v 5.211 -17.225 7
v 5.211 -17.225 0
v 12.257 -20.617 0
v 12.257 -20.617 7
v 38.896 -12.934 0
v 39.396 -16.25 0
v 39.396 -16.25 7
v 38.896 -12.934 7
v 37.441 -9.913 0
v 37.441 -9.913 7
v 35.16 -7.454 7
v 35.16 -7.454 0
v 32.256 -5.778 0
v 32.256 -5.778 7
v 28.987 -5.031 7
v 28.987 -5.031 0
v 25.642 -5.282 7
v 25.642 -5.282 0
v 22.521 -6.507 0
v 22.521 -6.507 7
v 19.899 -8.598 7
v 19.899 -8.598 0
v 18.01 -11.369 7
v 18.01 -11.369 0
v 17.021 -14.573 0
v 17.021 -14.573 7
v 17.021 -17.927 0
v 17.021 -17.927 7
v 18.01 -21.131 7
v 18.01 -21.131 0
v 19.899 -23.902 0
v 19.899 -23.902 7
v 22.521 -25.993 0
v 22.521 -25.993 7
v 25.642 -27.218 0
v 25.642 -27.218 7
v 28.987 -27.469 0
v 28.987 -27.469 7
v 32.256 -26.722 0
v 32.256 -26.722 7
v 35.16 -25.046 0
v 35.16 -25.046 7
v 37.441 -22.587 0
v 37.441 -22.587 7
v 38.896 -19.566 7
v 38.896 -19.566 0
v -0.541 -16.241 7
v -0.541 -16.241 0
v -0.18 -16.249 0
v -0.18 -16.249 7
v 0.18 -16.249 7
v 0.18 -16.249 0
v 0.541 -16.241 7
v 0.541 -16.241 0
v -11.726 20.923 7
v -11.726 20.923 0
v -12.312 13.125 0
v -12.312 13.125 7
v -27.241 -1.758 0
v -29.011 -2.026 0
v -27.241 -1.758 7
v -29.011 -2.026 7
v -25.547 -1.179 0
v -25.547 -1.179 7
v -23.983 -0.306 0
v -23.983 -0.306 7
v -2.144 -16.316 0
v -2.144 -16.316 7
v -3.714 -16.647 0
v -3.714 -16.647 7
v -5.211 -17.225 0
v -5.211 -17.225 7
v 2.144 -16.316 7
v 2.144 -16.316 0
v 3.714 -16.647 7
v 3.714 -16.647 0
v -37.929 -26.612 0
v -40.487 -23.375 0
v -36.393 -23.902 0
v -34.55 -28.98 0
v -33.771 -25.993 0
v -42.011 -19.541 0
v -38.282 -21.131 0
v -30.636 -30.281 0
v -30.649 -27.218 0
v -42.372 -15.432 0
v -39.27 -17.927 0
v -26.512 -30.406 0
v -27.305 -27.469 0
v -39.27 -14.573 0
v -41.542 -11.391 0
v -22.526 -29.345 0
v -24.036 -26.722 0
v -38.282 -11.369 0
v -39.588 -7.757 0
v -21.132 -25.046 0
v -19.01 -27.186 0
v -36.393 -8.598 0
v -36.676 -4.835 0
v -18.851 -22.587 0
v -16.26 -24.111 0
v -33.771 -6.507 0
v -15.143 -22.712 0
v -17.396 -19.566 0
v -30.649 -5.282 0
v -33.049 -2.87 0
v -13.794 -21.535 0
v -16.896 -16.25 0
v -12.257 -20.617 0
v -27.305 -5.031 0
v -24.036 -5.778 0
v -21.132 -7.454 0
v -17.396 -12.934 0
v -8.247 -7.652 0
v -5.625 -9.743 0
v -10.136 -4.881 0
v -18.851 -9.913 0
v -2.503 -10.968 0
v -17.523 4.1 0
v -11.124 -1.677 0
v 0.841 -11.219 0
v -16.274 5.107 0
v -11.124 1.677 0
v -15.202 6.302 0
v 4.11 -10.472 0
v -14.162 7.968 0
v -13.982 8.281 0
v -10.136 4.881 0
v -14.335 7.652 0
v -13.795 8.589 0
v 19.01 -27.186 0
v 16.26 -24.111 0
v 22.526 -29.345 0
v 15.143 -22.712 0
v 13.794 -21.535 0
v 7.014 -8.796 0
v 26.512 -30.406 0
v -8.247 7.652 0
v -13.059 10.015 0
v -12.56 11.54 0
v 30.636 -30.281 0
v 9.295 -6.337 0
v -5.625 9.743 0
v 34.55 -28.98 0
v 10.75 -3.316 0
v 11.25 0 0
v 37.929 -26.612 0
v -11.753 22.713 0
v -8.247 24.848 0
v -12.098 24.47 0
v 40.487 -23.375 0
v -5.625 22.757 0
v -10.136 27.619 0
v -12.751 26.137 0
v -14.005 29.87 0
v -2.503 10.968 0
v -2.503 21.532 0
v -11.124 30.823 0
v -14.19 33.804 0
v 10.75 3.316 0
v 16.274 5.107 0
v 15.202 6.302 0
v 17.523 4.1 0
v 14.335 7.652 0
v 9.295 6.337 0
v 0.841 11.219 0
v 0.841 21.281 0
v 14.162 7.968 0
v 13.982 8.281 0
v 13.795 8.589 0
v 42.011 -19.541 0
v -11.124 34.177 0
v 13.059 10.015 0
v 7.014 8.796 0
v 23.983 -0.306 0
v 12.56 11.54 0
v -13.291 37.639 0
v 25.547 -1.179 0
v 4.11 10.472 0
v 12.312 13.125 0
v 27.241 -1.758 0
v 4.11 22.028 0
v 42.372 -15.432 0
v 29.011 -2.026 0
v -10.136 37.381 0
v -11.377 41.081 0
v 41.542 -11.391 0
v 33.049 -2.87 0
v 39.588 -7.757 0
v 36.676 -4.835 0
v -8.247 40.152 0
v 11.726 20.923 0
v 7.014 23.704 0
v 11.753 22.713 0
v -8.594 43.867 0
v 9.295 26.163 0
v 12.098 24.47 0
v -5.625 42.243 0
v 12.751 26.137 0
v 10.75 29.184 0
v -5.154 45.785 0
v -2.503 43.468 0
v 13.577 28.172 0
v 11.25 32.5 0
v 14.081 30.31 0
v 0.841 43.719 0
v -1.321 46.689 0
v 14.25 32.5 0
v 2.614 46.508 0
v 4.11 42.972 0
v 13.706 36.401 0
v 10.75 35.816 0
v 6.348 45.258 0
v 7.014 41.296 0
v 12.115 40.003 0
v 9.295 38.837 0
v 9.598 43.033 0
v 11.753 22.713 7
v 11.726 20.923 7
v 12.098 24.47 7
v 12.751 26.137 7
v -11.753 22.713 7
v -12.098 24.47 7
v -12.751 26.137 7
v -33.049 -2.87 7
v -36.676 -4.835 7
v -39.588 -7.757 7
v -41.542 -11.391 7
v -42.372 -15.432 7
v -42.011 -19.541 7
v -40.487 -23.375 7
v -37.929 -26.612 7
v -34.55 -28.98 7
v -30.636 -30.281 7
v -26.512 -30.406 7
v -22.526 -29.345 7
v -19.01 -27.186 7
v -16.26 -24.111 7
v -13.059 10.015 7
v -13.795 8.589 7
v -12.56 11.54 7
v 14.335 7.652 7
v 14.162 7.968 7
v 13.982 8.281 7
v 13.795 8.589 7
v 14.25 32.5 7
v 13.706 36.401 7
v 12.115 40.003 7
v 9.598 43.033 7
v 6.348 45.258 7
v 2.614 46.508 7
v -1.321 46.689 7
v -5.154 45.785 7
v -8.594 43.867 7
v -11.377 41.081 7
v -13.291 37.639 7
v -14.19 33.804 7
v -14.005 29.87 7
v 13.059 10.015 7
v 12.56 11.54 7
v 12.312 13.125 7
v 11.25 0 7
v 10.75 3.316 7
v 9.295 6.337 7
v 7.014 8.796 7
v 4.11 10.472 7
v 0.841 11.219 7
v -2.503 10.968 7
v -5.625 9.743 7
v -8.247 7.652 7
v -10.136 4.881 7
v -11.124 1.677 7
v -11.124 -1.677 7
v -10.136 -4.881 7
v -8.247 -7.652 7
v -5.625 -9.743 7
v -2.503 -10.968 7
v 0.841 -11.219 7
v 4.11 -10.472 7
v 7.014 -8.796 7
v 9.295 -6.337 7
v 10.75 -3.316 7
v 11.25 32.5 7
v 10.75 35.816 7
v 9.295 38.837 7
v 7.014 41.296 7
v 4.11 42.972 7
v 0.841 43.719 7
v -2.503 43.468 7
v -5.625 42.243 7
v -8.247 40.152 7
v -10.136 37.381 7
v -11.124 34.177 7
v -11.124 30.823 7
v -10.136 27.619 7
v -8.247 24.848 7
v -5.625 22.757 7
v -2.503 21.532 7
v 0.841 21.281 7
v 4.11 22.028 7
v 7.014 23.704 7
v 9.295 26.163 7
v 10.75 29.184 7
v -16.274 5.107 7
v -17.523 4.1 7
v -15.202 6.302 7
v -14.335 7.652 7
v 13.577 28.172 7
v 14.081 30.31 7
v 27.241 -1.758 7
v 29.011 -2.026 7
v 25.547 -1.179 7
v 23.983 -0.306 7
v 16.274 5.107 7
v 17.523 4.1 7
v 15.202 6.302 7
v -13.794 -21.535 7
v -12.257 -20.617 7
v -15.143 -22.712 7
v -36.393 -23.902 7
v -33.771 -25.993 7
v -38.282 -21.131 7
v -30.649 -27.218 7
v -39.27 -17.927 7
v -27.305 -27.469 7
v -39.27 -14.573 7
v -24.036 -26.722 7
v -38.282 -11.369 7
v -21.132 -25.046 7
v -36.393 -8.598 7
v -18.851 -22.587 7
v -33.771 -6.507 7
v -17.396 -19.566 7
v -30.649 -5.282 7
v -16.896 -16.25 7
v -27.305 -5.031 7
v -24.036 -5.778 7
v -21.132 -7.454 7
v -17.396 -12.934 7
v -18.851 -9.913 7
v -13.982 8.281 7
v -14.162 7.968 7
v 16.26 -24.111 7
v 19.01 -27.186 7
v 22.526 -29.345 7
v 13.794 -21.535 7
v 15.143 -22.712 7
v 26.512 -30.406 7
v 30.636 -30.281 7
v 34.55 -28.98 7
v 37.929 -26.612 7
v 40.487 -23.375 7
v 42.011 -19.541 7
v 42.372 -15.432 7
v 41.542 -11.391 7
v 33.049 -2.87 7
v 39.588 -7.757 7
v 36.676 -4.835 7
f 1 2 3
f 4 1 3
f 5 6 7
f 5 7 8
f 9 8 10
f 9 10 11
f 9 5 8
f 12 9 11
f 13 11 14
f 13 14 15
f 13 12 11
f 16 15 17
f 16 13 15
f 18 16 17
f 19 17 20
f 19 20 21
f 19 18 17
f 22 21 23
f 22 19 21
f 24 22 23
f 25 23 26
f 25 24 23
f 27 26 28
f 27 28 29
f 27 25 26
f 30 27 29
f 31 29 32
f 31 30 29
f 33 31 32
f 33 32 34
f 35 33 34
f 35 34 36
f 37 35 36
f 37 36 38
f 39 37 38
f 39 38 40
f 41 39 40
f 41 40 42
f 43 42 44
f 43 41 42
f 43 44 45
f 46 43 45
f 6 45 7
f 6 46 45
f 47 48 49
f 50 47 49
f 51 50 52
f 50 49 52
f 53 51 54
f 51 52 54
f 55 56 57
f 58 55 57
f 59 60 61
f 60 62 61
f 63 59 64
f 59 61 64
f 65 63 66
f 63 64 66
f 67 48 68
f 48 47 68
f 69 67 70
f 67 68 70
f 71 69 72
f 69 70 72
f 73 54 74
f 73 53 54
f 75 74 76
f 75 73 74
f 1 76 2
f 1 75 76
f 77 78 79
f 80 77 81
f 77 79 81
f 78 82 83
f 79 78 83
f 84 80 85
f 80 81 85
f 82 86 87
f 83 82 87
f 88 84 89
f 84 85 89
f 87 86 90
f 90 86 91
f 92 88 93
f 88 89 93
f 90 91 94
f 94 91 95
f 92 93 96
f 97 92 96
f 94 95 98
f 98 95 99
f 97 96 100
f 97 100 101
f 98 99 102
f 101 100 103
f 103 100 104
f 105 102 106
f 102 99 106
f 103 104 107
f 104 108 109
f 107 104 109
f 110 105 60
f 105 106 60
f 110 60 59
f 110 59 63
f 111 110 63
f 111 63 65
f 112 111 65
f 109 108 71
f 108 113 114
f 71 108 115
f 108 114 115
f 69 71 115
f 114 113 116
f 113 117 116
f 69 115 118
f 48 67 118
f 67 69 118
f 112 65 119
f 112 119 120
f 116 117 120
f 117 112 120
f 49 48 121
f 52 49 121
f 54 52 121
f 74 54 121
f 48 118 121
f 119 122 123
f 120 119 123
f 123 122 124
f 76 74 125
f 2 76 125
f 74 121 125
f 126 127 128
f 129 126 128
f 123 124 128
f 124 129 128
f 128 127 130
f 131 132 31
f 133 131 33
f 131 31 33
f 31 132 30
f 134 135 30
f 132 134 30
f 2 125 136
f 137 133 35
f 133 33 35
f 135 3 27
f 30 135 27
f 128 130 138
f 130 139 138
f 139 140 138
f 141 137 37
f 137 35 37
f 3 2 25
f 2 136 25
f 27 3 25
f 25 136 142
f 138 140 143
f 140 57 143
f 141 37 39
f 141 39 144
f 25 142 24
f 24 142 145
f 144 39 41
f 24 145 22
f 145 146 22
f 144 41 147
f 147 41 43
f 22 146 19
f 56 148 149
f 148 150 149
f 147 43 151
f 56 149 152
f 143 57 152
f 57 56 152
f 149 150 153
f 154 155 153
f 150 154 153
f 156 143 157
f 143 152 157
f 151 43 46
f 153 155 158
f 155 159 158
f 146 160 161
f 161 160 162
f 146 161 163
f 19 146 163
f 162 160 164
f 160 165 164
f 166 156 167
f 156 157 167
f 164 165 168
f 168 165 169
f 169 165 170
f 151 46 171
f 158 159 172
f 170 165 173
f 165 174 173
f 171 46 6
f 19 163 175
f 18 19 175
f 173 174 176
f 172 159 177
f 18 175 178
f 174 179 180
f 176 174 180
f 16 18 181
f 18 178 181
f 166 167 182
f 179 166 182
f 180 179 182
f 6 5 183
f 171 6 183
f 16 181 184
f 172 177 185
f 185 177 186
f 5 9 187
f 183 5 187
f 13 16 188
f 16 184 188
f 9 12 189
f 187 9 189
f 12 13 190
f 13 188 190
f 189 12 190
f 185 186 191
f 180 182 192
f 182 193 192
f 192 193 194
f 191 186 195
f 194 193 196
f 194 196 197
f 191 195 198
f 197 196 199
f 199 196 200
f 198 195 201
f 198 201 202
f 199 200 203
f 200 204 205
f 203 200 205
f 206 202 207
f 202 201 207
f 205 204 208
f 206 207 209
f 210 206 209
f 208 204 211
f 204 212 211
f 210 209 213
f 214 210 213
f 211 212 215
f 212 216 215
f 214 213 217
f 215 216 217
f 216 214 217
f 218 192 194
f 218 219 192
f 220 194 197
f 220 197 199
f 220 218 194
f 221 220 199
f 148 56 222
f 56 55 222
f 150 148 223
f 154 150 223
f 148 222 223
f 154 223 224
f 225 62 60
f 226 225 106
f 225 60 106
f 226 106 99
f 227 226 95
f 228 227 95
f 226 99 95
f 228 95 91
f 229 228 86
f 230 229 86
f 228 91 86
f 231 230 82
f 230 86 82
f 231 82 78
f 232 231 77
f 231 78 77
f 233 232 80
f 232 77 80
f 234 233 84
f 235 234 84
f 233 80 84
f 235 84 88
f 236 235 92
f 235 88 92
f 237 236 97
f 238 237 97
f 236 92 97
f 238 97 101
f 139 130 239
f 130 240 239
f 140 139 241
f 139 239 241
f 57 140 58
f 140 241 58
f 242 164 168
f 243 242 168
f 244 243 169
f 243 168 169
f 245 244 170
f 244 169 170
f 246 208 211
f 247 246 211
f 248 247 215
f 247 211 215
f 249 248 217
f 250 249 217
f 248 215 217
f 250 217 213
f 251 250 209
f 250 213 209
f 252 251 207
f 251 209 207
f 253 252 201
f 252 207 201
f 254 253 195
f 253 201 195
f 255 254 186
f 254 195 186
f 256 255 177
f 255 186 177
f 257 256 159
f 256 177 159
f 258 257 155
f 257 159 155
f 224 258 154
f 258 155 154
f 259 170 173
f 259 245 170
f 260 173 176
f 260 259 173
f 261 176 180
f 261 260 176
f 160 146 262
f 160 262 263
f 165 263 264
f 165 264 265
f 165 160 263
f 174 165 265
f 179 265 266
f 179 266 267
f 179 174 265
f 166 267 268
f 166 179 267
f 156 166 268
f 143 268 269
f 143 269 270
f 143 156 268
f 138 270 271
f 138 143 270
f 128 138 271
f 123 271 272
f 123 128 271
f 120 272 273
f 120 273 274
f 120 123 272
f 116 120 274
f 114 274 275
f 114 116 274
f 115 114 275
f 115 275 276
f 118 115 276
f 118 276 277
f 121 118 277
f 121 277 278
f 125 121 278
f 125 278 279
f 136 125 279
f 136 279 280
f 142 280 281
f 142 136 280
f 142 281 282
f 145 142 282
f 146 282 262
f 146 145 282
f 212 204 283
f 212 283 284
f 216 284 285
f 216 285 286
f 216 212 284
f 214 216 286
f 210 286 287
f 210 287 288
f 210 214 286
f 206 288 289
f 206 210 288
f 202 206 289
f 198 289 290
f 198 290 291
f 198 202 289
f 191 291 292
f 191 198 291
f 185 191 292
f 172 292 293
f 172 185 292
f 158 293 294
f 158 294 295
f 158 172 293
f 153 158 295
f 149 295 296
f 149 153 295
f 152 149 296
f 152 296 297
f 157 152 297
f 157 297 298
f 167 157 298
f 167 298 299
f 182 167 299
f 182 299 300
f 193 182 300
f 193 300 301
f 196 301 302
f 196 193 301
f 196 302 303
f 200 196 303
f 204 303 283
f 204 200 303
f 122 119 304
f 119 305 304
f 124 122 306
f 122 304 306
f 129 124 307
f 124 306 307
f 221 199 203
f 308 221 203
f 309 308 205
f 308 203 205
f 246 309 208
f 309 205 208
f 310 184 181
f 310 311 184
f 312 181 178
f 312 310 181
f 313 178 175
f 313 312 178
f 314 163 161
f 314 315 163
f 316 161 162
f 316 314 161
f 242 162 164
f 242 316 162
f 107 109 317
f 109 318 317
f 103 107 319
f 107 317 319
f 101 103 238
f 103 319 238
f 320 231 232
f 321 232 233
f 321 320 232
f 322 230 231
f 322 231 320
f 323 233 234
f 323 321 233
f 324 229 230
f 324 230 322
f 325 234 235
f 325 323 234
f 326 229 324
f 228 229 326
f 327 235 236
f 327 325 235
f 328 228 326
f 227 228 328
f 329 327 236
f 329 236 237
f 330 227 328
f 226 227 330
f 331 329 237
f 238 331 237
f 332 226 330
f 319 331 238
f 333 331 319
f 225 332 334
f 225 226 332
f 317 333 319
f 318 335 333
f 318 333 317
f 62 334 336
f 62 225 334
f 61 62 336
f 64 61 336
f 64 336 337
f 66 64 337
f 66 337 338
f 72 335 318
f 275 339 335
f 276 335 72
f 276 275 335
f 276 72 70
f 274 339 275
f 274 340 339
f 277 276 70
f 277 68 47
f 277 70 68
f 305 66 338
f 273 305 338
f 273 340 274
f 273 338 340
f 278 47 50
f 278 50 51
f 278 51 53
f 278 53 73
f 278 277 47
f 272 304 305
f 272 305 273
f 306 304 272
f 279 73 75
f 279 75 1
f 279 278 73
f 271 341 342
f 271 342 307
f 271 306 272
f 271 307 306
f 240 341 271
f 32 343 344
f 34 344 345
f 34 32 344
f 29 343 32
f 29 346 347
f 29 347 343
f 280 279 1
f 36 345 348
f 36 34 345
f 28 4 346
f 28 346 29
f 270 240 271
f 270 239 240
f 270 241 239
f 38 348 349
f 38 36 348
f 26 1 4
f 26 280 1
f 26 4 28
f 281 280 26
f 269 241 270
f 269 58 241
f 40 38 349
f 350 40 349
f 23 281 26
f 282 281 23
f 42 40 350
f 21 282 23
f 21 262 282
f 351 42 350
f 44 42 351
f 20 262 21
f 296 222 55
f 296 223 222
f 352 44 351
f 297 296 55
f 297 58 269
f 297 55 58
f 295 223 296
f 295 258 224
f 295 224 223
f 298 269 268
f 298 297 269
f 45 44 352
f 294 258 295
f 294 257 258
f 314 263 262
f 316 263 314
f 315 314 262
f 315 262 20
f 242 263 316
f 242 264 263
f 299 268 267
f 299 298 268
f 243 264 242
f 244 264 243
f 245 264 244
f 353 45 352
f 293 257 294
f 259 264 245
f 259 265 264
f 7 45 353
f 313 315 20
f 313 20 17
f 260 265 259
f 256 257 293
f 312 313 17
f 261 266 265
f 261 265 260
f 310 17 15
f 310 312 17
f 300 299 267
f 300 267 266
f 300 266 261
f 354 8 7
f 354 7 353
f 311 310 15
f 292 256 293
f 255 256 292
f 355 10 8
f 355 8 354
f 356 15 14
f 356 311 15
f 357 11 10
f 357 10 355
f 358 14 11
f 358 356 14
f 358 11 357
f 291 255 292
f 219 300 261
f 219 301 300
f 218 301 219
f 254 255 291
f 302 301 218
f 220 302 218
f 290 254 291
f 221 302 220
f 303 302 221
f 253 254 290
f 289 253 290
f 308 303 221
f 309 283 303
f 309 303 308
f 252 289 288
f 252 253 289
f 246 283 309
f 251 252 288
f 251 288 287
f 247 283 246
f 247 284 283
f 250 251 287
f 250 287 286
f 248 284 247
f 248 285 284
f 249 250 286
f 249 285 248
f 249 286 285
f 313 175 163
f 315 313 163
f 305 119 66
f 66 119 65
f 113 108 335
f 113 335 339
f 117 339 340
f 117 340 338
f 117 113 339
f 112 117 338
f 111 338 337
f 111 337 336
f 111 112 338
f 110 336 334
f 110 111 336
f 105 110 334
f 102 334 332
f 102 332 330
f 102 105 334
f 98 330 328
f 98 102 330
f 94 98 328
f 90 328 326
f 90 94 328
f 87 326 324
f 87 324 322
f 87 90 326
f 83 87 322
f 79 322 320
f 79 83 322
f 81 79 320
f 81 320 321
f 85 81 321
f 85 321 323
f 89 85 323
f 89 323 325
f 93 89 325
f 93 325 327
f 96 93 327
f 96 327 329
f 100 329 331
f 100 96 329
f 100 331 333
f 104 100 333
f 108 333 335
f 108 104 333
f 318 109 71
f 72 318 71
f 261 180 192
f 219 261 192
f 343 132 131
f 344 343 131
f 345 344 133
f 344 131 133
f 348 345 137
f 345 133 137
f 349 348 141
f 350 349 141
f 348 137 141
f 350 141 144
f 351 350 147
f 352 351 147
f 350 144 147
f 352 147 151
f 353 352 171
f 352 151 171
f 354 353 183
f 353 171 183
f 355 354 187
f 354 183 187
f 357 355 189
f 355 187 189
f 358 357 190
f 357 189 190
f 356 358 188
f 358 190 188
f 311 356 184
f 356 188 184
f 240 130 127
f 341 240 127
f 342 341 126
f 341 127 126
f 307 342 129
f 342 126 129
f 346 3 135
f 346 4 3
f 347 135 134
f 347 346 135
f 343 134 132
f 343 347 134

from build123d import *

# Parameters (mm, degrees)
F0_R     = 11.25
F1_DEPTH = 7
F2_R     = 10


# Not quite as in the source:
# - a feature names something its author has since deleted; it is built from what else it names


with BuildPart() as f1:
    # F0 (on Top) → F1 (new body)
    with BuildSketch(Plane.XY):
        with BuildLine():
            ThreePointArc((2.7119035956, -16.0221121856), (12.4123110948, -10.4879470482), (16.25, 0))
            ThreePointArc((16.25, 0), (15.9933502519, 2.8766730299), (15.2315079728, 5.6624786864))
            ThreePointArc((15.2315079728, 5.6624786864), (14.0729128115, 8.125), (12.5196043772, 10.3596334992))
            ThreePointArc((12.5196043772, 10.3596334992), (0, 16.25), (-12.5196043772, 10.3596334992))
            ThreePointArc((-12.5196043772, 10.3596334992), (-14.0729128115, 8.125), (-15.2315079728, 5.6624786864))
            ThreePointArc((-15.2315079728, 5.6624786864), (-14.0729128115, -8.125), (-2.7119035956, -16.0221121856))
            ThreePointArc((-2.7119035956, -16.0221121856), (0, -16.25), (2.7119035956, -16.0221121856))
        make_face()
        Circle(F0_R, mode=Mode.SUBTRACT)
        with BuildLine():
            ThreePointArc((15.2315079728, 5.6624786864), (15.9933502519, 2.8766730299), (16.25, 0))
            ThreePointArc((16.25, 0), (12.4123110948, -10.4879470482), (2.7119035956, -16.0221121856))
            Line((2.7119035956, -16.0221121856), (15.101342571, -21.9861975129))
            ThreePointArc((15.101342571, -21.9861975129), (15.8049636191, -9.125), (26.5912768643, -2.0850475413))
            Line((26.5912768643, -2.0850475413), (15.2315079728, 5.6624786864))
        make_face()
        with BuildLine():
            ThreePointArc((-12.5196043772, 10.3596334992), (0, 16.25), (12.5196043772, 10.3596334992))
            Line((12.5196043772, 10.3596334992), (11.4899342932, 24.0712450542))
            ThreePointArc((11.4899342932, 24.0712450542), (0, 18.25), (-11.4899342932, 24.0712450542))
            Line((-11.4899342932, 24.0712450542), (-12.5196043772, 10.3596334992))
        make_face()
        with BuildLine():
            ThreePointArc((42.395825623, -16.25), (37.6566137131, -5.6383361387), (26.5912768643, -2.0850475413))
            ThreePointArc((26.5912768643, -2.0850475413), (15.8049636191, -9.125), (15.101342571, -21.9861975129))
            ThreePointArc((15.101342571, -21.9861975129), (31.0765777883, -30.1953645254), (42.395825623, -16.25))
        make_face()
        with Locations((28.145825623, -16.25)):
            Circle(F0_R, mode=Mode.SUBTRACT)
        with BuildLine():
            Line((-15.101342571, -21.9861975129), (-2.7119035956, -16.0221121856))
            ThreePointArc((-2.7119035956, -16.0221121856), (-14.0729128115, -8.125), (-15.2315079728, 5.6624786864))
            Line((-15.2315079728, 5.6624786864), (-26.5912768643, -2.0850475413))
            ThreePointArc((-26.5912768643, -2.0850475413), (-17.5341617617, -6.7392119099), (-13.895825623, -16.25))
            ThreePointArc((-13.895825623, -16.25), (-14.2004610976, -19.1807521653), (-15.101342571, -21.9861975129))
        make_face()
        with BuildLine():
            ThreePointArc((-11.4899342932, 24.0712450542), (0, 18.25), (11.4899342932, 24.0712450542))
            ThreePointArc((11.4899342932, 24.0712450542), (13.5424160267, 28.0654235647), (14.25, 32.5))
            ThreePointArc((14.25, 32.5), (-4.4345764353, 46.0424160267), (-11.4899342932, 24.0712450542))
        make_face()
        with Locations((0, 32.5)):
            Circle(F0_R, mode=Mode.SUBTRACT)
        with BuildLine():
            ThreePointArc((-26.5912768643, -2.0850475413), (-40.4866876269, -23.375), (-15.101342571, -21.9861975129))
            ThreePointArc((-15.101342571, -21.9861975129), (-14.2004610976, -19.1807521653), (-13.895825623, -16.25))
            ThreePointArc((-13.895825623, -16.25), (-17.5341617617, -6.7392119099), (-26.5912768643, -2.0850475413))
        make_face()
        with Locations((-28.145825623, -16.25)):
            Circle(F0_R, mode=Mode.SUBTRACT)
    extrude(amount=F1_DEPTH)

    # F2
    f2_edges = [f1.edges().sort_by_distance(p)[0] for p in [
        (-11.489934, 24.071245, 3.5),
        (-12.519604, 10.359633, 3.5),
        (-15.231508, 5.662479, 3.5),
        (-26.591277, -2.085048, 3.5),
        (2.711904, -16.022112, 3.5),
        (-2.711904, -16.022112, 3.5),
        (15.101343, -21.986198, 3.5),
        (-15.101343, -21.986198, 3.5),
        (26.591277, -2.085048, 3.5),
        (15.231508, 5.662479, 3.5),
        (12.519604, 10.359633, 3.5),
        (11.489934, 24.071245, 3.5),
    ]]
    fillet(f2_edges, radius=F2_R)


solid = f1.part
